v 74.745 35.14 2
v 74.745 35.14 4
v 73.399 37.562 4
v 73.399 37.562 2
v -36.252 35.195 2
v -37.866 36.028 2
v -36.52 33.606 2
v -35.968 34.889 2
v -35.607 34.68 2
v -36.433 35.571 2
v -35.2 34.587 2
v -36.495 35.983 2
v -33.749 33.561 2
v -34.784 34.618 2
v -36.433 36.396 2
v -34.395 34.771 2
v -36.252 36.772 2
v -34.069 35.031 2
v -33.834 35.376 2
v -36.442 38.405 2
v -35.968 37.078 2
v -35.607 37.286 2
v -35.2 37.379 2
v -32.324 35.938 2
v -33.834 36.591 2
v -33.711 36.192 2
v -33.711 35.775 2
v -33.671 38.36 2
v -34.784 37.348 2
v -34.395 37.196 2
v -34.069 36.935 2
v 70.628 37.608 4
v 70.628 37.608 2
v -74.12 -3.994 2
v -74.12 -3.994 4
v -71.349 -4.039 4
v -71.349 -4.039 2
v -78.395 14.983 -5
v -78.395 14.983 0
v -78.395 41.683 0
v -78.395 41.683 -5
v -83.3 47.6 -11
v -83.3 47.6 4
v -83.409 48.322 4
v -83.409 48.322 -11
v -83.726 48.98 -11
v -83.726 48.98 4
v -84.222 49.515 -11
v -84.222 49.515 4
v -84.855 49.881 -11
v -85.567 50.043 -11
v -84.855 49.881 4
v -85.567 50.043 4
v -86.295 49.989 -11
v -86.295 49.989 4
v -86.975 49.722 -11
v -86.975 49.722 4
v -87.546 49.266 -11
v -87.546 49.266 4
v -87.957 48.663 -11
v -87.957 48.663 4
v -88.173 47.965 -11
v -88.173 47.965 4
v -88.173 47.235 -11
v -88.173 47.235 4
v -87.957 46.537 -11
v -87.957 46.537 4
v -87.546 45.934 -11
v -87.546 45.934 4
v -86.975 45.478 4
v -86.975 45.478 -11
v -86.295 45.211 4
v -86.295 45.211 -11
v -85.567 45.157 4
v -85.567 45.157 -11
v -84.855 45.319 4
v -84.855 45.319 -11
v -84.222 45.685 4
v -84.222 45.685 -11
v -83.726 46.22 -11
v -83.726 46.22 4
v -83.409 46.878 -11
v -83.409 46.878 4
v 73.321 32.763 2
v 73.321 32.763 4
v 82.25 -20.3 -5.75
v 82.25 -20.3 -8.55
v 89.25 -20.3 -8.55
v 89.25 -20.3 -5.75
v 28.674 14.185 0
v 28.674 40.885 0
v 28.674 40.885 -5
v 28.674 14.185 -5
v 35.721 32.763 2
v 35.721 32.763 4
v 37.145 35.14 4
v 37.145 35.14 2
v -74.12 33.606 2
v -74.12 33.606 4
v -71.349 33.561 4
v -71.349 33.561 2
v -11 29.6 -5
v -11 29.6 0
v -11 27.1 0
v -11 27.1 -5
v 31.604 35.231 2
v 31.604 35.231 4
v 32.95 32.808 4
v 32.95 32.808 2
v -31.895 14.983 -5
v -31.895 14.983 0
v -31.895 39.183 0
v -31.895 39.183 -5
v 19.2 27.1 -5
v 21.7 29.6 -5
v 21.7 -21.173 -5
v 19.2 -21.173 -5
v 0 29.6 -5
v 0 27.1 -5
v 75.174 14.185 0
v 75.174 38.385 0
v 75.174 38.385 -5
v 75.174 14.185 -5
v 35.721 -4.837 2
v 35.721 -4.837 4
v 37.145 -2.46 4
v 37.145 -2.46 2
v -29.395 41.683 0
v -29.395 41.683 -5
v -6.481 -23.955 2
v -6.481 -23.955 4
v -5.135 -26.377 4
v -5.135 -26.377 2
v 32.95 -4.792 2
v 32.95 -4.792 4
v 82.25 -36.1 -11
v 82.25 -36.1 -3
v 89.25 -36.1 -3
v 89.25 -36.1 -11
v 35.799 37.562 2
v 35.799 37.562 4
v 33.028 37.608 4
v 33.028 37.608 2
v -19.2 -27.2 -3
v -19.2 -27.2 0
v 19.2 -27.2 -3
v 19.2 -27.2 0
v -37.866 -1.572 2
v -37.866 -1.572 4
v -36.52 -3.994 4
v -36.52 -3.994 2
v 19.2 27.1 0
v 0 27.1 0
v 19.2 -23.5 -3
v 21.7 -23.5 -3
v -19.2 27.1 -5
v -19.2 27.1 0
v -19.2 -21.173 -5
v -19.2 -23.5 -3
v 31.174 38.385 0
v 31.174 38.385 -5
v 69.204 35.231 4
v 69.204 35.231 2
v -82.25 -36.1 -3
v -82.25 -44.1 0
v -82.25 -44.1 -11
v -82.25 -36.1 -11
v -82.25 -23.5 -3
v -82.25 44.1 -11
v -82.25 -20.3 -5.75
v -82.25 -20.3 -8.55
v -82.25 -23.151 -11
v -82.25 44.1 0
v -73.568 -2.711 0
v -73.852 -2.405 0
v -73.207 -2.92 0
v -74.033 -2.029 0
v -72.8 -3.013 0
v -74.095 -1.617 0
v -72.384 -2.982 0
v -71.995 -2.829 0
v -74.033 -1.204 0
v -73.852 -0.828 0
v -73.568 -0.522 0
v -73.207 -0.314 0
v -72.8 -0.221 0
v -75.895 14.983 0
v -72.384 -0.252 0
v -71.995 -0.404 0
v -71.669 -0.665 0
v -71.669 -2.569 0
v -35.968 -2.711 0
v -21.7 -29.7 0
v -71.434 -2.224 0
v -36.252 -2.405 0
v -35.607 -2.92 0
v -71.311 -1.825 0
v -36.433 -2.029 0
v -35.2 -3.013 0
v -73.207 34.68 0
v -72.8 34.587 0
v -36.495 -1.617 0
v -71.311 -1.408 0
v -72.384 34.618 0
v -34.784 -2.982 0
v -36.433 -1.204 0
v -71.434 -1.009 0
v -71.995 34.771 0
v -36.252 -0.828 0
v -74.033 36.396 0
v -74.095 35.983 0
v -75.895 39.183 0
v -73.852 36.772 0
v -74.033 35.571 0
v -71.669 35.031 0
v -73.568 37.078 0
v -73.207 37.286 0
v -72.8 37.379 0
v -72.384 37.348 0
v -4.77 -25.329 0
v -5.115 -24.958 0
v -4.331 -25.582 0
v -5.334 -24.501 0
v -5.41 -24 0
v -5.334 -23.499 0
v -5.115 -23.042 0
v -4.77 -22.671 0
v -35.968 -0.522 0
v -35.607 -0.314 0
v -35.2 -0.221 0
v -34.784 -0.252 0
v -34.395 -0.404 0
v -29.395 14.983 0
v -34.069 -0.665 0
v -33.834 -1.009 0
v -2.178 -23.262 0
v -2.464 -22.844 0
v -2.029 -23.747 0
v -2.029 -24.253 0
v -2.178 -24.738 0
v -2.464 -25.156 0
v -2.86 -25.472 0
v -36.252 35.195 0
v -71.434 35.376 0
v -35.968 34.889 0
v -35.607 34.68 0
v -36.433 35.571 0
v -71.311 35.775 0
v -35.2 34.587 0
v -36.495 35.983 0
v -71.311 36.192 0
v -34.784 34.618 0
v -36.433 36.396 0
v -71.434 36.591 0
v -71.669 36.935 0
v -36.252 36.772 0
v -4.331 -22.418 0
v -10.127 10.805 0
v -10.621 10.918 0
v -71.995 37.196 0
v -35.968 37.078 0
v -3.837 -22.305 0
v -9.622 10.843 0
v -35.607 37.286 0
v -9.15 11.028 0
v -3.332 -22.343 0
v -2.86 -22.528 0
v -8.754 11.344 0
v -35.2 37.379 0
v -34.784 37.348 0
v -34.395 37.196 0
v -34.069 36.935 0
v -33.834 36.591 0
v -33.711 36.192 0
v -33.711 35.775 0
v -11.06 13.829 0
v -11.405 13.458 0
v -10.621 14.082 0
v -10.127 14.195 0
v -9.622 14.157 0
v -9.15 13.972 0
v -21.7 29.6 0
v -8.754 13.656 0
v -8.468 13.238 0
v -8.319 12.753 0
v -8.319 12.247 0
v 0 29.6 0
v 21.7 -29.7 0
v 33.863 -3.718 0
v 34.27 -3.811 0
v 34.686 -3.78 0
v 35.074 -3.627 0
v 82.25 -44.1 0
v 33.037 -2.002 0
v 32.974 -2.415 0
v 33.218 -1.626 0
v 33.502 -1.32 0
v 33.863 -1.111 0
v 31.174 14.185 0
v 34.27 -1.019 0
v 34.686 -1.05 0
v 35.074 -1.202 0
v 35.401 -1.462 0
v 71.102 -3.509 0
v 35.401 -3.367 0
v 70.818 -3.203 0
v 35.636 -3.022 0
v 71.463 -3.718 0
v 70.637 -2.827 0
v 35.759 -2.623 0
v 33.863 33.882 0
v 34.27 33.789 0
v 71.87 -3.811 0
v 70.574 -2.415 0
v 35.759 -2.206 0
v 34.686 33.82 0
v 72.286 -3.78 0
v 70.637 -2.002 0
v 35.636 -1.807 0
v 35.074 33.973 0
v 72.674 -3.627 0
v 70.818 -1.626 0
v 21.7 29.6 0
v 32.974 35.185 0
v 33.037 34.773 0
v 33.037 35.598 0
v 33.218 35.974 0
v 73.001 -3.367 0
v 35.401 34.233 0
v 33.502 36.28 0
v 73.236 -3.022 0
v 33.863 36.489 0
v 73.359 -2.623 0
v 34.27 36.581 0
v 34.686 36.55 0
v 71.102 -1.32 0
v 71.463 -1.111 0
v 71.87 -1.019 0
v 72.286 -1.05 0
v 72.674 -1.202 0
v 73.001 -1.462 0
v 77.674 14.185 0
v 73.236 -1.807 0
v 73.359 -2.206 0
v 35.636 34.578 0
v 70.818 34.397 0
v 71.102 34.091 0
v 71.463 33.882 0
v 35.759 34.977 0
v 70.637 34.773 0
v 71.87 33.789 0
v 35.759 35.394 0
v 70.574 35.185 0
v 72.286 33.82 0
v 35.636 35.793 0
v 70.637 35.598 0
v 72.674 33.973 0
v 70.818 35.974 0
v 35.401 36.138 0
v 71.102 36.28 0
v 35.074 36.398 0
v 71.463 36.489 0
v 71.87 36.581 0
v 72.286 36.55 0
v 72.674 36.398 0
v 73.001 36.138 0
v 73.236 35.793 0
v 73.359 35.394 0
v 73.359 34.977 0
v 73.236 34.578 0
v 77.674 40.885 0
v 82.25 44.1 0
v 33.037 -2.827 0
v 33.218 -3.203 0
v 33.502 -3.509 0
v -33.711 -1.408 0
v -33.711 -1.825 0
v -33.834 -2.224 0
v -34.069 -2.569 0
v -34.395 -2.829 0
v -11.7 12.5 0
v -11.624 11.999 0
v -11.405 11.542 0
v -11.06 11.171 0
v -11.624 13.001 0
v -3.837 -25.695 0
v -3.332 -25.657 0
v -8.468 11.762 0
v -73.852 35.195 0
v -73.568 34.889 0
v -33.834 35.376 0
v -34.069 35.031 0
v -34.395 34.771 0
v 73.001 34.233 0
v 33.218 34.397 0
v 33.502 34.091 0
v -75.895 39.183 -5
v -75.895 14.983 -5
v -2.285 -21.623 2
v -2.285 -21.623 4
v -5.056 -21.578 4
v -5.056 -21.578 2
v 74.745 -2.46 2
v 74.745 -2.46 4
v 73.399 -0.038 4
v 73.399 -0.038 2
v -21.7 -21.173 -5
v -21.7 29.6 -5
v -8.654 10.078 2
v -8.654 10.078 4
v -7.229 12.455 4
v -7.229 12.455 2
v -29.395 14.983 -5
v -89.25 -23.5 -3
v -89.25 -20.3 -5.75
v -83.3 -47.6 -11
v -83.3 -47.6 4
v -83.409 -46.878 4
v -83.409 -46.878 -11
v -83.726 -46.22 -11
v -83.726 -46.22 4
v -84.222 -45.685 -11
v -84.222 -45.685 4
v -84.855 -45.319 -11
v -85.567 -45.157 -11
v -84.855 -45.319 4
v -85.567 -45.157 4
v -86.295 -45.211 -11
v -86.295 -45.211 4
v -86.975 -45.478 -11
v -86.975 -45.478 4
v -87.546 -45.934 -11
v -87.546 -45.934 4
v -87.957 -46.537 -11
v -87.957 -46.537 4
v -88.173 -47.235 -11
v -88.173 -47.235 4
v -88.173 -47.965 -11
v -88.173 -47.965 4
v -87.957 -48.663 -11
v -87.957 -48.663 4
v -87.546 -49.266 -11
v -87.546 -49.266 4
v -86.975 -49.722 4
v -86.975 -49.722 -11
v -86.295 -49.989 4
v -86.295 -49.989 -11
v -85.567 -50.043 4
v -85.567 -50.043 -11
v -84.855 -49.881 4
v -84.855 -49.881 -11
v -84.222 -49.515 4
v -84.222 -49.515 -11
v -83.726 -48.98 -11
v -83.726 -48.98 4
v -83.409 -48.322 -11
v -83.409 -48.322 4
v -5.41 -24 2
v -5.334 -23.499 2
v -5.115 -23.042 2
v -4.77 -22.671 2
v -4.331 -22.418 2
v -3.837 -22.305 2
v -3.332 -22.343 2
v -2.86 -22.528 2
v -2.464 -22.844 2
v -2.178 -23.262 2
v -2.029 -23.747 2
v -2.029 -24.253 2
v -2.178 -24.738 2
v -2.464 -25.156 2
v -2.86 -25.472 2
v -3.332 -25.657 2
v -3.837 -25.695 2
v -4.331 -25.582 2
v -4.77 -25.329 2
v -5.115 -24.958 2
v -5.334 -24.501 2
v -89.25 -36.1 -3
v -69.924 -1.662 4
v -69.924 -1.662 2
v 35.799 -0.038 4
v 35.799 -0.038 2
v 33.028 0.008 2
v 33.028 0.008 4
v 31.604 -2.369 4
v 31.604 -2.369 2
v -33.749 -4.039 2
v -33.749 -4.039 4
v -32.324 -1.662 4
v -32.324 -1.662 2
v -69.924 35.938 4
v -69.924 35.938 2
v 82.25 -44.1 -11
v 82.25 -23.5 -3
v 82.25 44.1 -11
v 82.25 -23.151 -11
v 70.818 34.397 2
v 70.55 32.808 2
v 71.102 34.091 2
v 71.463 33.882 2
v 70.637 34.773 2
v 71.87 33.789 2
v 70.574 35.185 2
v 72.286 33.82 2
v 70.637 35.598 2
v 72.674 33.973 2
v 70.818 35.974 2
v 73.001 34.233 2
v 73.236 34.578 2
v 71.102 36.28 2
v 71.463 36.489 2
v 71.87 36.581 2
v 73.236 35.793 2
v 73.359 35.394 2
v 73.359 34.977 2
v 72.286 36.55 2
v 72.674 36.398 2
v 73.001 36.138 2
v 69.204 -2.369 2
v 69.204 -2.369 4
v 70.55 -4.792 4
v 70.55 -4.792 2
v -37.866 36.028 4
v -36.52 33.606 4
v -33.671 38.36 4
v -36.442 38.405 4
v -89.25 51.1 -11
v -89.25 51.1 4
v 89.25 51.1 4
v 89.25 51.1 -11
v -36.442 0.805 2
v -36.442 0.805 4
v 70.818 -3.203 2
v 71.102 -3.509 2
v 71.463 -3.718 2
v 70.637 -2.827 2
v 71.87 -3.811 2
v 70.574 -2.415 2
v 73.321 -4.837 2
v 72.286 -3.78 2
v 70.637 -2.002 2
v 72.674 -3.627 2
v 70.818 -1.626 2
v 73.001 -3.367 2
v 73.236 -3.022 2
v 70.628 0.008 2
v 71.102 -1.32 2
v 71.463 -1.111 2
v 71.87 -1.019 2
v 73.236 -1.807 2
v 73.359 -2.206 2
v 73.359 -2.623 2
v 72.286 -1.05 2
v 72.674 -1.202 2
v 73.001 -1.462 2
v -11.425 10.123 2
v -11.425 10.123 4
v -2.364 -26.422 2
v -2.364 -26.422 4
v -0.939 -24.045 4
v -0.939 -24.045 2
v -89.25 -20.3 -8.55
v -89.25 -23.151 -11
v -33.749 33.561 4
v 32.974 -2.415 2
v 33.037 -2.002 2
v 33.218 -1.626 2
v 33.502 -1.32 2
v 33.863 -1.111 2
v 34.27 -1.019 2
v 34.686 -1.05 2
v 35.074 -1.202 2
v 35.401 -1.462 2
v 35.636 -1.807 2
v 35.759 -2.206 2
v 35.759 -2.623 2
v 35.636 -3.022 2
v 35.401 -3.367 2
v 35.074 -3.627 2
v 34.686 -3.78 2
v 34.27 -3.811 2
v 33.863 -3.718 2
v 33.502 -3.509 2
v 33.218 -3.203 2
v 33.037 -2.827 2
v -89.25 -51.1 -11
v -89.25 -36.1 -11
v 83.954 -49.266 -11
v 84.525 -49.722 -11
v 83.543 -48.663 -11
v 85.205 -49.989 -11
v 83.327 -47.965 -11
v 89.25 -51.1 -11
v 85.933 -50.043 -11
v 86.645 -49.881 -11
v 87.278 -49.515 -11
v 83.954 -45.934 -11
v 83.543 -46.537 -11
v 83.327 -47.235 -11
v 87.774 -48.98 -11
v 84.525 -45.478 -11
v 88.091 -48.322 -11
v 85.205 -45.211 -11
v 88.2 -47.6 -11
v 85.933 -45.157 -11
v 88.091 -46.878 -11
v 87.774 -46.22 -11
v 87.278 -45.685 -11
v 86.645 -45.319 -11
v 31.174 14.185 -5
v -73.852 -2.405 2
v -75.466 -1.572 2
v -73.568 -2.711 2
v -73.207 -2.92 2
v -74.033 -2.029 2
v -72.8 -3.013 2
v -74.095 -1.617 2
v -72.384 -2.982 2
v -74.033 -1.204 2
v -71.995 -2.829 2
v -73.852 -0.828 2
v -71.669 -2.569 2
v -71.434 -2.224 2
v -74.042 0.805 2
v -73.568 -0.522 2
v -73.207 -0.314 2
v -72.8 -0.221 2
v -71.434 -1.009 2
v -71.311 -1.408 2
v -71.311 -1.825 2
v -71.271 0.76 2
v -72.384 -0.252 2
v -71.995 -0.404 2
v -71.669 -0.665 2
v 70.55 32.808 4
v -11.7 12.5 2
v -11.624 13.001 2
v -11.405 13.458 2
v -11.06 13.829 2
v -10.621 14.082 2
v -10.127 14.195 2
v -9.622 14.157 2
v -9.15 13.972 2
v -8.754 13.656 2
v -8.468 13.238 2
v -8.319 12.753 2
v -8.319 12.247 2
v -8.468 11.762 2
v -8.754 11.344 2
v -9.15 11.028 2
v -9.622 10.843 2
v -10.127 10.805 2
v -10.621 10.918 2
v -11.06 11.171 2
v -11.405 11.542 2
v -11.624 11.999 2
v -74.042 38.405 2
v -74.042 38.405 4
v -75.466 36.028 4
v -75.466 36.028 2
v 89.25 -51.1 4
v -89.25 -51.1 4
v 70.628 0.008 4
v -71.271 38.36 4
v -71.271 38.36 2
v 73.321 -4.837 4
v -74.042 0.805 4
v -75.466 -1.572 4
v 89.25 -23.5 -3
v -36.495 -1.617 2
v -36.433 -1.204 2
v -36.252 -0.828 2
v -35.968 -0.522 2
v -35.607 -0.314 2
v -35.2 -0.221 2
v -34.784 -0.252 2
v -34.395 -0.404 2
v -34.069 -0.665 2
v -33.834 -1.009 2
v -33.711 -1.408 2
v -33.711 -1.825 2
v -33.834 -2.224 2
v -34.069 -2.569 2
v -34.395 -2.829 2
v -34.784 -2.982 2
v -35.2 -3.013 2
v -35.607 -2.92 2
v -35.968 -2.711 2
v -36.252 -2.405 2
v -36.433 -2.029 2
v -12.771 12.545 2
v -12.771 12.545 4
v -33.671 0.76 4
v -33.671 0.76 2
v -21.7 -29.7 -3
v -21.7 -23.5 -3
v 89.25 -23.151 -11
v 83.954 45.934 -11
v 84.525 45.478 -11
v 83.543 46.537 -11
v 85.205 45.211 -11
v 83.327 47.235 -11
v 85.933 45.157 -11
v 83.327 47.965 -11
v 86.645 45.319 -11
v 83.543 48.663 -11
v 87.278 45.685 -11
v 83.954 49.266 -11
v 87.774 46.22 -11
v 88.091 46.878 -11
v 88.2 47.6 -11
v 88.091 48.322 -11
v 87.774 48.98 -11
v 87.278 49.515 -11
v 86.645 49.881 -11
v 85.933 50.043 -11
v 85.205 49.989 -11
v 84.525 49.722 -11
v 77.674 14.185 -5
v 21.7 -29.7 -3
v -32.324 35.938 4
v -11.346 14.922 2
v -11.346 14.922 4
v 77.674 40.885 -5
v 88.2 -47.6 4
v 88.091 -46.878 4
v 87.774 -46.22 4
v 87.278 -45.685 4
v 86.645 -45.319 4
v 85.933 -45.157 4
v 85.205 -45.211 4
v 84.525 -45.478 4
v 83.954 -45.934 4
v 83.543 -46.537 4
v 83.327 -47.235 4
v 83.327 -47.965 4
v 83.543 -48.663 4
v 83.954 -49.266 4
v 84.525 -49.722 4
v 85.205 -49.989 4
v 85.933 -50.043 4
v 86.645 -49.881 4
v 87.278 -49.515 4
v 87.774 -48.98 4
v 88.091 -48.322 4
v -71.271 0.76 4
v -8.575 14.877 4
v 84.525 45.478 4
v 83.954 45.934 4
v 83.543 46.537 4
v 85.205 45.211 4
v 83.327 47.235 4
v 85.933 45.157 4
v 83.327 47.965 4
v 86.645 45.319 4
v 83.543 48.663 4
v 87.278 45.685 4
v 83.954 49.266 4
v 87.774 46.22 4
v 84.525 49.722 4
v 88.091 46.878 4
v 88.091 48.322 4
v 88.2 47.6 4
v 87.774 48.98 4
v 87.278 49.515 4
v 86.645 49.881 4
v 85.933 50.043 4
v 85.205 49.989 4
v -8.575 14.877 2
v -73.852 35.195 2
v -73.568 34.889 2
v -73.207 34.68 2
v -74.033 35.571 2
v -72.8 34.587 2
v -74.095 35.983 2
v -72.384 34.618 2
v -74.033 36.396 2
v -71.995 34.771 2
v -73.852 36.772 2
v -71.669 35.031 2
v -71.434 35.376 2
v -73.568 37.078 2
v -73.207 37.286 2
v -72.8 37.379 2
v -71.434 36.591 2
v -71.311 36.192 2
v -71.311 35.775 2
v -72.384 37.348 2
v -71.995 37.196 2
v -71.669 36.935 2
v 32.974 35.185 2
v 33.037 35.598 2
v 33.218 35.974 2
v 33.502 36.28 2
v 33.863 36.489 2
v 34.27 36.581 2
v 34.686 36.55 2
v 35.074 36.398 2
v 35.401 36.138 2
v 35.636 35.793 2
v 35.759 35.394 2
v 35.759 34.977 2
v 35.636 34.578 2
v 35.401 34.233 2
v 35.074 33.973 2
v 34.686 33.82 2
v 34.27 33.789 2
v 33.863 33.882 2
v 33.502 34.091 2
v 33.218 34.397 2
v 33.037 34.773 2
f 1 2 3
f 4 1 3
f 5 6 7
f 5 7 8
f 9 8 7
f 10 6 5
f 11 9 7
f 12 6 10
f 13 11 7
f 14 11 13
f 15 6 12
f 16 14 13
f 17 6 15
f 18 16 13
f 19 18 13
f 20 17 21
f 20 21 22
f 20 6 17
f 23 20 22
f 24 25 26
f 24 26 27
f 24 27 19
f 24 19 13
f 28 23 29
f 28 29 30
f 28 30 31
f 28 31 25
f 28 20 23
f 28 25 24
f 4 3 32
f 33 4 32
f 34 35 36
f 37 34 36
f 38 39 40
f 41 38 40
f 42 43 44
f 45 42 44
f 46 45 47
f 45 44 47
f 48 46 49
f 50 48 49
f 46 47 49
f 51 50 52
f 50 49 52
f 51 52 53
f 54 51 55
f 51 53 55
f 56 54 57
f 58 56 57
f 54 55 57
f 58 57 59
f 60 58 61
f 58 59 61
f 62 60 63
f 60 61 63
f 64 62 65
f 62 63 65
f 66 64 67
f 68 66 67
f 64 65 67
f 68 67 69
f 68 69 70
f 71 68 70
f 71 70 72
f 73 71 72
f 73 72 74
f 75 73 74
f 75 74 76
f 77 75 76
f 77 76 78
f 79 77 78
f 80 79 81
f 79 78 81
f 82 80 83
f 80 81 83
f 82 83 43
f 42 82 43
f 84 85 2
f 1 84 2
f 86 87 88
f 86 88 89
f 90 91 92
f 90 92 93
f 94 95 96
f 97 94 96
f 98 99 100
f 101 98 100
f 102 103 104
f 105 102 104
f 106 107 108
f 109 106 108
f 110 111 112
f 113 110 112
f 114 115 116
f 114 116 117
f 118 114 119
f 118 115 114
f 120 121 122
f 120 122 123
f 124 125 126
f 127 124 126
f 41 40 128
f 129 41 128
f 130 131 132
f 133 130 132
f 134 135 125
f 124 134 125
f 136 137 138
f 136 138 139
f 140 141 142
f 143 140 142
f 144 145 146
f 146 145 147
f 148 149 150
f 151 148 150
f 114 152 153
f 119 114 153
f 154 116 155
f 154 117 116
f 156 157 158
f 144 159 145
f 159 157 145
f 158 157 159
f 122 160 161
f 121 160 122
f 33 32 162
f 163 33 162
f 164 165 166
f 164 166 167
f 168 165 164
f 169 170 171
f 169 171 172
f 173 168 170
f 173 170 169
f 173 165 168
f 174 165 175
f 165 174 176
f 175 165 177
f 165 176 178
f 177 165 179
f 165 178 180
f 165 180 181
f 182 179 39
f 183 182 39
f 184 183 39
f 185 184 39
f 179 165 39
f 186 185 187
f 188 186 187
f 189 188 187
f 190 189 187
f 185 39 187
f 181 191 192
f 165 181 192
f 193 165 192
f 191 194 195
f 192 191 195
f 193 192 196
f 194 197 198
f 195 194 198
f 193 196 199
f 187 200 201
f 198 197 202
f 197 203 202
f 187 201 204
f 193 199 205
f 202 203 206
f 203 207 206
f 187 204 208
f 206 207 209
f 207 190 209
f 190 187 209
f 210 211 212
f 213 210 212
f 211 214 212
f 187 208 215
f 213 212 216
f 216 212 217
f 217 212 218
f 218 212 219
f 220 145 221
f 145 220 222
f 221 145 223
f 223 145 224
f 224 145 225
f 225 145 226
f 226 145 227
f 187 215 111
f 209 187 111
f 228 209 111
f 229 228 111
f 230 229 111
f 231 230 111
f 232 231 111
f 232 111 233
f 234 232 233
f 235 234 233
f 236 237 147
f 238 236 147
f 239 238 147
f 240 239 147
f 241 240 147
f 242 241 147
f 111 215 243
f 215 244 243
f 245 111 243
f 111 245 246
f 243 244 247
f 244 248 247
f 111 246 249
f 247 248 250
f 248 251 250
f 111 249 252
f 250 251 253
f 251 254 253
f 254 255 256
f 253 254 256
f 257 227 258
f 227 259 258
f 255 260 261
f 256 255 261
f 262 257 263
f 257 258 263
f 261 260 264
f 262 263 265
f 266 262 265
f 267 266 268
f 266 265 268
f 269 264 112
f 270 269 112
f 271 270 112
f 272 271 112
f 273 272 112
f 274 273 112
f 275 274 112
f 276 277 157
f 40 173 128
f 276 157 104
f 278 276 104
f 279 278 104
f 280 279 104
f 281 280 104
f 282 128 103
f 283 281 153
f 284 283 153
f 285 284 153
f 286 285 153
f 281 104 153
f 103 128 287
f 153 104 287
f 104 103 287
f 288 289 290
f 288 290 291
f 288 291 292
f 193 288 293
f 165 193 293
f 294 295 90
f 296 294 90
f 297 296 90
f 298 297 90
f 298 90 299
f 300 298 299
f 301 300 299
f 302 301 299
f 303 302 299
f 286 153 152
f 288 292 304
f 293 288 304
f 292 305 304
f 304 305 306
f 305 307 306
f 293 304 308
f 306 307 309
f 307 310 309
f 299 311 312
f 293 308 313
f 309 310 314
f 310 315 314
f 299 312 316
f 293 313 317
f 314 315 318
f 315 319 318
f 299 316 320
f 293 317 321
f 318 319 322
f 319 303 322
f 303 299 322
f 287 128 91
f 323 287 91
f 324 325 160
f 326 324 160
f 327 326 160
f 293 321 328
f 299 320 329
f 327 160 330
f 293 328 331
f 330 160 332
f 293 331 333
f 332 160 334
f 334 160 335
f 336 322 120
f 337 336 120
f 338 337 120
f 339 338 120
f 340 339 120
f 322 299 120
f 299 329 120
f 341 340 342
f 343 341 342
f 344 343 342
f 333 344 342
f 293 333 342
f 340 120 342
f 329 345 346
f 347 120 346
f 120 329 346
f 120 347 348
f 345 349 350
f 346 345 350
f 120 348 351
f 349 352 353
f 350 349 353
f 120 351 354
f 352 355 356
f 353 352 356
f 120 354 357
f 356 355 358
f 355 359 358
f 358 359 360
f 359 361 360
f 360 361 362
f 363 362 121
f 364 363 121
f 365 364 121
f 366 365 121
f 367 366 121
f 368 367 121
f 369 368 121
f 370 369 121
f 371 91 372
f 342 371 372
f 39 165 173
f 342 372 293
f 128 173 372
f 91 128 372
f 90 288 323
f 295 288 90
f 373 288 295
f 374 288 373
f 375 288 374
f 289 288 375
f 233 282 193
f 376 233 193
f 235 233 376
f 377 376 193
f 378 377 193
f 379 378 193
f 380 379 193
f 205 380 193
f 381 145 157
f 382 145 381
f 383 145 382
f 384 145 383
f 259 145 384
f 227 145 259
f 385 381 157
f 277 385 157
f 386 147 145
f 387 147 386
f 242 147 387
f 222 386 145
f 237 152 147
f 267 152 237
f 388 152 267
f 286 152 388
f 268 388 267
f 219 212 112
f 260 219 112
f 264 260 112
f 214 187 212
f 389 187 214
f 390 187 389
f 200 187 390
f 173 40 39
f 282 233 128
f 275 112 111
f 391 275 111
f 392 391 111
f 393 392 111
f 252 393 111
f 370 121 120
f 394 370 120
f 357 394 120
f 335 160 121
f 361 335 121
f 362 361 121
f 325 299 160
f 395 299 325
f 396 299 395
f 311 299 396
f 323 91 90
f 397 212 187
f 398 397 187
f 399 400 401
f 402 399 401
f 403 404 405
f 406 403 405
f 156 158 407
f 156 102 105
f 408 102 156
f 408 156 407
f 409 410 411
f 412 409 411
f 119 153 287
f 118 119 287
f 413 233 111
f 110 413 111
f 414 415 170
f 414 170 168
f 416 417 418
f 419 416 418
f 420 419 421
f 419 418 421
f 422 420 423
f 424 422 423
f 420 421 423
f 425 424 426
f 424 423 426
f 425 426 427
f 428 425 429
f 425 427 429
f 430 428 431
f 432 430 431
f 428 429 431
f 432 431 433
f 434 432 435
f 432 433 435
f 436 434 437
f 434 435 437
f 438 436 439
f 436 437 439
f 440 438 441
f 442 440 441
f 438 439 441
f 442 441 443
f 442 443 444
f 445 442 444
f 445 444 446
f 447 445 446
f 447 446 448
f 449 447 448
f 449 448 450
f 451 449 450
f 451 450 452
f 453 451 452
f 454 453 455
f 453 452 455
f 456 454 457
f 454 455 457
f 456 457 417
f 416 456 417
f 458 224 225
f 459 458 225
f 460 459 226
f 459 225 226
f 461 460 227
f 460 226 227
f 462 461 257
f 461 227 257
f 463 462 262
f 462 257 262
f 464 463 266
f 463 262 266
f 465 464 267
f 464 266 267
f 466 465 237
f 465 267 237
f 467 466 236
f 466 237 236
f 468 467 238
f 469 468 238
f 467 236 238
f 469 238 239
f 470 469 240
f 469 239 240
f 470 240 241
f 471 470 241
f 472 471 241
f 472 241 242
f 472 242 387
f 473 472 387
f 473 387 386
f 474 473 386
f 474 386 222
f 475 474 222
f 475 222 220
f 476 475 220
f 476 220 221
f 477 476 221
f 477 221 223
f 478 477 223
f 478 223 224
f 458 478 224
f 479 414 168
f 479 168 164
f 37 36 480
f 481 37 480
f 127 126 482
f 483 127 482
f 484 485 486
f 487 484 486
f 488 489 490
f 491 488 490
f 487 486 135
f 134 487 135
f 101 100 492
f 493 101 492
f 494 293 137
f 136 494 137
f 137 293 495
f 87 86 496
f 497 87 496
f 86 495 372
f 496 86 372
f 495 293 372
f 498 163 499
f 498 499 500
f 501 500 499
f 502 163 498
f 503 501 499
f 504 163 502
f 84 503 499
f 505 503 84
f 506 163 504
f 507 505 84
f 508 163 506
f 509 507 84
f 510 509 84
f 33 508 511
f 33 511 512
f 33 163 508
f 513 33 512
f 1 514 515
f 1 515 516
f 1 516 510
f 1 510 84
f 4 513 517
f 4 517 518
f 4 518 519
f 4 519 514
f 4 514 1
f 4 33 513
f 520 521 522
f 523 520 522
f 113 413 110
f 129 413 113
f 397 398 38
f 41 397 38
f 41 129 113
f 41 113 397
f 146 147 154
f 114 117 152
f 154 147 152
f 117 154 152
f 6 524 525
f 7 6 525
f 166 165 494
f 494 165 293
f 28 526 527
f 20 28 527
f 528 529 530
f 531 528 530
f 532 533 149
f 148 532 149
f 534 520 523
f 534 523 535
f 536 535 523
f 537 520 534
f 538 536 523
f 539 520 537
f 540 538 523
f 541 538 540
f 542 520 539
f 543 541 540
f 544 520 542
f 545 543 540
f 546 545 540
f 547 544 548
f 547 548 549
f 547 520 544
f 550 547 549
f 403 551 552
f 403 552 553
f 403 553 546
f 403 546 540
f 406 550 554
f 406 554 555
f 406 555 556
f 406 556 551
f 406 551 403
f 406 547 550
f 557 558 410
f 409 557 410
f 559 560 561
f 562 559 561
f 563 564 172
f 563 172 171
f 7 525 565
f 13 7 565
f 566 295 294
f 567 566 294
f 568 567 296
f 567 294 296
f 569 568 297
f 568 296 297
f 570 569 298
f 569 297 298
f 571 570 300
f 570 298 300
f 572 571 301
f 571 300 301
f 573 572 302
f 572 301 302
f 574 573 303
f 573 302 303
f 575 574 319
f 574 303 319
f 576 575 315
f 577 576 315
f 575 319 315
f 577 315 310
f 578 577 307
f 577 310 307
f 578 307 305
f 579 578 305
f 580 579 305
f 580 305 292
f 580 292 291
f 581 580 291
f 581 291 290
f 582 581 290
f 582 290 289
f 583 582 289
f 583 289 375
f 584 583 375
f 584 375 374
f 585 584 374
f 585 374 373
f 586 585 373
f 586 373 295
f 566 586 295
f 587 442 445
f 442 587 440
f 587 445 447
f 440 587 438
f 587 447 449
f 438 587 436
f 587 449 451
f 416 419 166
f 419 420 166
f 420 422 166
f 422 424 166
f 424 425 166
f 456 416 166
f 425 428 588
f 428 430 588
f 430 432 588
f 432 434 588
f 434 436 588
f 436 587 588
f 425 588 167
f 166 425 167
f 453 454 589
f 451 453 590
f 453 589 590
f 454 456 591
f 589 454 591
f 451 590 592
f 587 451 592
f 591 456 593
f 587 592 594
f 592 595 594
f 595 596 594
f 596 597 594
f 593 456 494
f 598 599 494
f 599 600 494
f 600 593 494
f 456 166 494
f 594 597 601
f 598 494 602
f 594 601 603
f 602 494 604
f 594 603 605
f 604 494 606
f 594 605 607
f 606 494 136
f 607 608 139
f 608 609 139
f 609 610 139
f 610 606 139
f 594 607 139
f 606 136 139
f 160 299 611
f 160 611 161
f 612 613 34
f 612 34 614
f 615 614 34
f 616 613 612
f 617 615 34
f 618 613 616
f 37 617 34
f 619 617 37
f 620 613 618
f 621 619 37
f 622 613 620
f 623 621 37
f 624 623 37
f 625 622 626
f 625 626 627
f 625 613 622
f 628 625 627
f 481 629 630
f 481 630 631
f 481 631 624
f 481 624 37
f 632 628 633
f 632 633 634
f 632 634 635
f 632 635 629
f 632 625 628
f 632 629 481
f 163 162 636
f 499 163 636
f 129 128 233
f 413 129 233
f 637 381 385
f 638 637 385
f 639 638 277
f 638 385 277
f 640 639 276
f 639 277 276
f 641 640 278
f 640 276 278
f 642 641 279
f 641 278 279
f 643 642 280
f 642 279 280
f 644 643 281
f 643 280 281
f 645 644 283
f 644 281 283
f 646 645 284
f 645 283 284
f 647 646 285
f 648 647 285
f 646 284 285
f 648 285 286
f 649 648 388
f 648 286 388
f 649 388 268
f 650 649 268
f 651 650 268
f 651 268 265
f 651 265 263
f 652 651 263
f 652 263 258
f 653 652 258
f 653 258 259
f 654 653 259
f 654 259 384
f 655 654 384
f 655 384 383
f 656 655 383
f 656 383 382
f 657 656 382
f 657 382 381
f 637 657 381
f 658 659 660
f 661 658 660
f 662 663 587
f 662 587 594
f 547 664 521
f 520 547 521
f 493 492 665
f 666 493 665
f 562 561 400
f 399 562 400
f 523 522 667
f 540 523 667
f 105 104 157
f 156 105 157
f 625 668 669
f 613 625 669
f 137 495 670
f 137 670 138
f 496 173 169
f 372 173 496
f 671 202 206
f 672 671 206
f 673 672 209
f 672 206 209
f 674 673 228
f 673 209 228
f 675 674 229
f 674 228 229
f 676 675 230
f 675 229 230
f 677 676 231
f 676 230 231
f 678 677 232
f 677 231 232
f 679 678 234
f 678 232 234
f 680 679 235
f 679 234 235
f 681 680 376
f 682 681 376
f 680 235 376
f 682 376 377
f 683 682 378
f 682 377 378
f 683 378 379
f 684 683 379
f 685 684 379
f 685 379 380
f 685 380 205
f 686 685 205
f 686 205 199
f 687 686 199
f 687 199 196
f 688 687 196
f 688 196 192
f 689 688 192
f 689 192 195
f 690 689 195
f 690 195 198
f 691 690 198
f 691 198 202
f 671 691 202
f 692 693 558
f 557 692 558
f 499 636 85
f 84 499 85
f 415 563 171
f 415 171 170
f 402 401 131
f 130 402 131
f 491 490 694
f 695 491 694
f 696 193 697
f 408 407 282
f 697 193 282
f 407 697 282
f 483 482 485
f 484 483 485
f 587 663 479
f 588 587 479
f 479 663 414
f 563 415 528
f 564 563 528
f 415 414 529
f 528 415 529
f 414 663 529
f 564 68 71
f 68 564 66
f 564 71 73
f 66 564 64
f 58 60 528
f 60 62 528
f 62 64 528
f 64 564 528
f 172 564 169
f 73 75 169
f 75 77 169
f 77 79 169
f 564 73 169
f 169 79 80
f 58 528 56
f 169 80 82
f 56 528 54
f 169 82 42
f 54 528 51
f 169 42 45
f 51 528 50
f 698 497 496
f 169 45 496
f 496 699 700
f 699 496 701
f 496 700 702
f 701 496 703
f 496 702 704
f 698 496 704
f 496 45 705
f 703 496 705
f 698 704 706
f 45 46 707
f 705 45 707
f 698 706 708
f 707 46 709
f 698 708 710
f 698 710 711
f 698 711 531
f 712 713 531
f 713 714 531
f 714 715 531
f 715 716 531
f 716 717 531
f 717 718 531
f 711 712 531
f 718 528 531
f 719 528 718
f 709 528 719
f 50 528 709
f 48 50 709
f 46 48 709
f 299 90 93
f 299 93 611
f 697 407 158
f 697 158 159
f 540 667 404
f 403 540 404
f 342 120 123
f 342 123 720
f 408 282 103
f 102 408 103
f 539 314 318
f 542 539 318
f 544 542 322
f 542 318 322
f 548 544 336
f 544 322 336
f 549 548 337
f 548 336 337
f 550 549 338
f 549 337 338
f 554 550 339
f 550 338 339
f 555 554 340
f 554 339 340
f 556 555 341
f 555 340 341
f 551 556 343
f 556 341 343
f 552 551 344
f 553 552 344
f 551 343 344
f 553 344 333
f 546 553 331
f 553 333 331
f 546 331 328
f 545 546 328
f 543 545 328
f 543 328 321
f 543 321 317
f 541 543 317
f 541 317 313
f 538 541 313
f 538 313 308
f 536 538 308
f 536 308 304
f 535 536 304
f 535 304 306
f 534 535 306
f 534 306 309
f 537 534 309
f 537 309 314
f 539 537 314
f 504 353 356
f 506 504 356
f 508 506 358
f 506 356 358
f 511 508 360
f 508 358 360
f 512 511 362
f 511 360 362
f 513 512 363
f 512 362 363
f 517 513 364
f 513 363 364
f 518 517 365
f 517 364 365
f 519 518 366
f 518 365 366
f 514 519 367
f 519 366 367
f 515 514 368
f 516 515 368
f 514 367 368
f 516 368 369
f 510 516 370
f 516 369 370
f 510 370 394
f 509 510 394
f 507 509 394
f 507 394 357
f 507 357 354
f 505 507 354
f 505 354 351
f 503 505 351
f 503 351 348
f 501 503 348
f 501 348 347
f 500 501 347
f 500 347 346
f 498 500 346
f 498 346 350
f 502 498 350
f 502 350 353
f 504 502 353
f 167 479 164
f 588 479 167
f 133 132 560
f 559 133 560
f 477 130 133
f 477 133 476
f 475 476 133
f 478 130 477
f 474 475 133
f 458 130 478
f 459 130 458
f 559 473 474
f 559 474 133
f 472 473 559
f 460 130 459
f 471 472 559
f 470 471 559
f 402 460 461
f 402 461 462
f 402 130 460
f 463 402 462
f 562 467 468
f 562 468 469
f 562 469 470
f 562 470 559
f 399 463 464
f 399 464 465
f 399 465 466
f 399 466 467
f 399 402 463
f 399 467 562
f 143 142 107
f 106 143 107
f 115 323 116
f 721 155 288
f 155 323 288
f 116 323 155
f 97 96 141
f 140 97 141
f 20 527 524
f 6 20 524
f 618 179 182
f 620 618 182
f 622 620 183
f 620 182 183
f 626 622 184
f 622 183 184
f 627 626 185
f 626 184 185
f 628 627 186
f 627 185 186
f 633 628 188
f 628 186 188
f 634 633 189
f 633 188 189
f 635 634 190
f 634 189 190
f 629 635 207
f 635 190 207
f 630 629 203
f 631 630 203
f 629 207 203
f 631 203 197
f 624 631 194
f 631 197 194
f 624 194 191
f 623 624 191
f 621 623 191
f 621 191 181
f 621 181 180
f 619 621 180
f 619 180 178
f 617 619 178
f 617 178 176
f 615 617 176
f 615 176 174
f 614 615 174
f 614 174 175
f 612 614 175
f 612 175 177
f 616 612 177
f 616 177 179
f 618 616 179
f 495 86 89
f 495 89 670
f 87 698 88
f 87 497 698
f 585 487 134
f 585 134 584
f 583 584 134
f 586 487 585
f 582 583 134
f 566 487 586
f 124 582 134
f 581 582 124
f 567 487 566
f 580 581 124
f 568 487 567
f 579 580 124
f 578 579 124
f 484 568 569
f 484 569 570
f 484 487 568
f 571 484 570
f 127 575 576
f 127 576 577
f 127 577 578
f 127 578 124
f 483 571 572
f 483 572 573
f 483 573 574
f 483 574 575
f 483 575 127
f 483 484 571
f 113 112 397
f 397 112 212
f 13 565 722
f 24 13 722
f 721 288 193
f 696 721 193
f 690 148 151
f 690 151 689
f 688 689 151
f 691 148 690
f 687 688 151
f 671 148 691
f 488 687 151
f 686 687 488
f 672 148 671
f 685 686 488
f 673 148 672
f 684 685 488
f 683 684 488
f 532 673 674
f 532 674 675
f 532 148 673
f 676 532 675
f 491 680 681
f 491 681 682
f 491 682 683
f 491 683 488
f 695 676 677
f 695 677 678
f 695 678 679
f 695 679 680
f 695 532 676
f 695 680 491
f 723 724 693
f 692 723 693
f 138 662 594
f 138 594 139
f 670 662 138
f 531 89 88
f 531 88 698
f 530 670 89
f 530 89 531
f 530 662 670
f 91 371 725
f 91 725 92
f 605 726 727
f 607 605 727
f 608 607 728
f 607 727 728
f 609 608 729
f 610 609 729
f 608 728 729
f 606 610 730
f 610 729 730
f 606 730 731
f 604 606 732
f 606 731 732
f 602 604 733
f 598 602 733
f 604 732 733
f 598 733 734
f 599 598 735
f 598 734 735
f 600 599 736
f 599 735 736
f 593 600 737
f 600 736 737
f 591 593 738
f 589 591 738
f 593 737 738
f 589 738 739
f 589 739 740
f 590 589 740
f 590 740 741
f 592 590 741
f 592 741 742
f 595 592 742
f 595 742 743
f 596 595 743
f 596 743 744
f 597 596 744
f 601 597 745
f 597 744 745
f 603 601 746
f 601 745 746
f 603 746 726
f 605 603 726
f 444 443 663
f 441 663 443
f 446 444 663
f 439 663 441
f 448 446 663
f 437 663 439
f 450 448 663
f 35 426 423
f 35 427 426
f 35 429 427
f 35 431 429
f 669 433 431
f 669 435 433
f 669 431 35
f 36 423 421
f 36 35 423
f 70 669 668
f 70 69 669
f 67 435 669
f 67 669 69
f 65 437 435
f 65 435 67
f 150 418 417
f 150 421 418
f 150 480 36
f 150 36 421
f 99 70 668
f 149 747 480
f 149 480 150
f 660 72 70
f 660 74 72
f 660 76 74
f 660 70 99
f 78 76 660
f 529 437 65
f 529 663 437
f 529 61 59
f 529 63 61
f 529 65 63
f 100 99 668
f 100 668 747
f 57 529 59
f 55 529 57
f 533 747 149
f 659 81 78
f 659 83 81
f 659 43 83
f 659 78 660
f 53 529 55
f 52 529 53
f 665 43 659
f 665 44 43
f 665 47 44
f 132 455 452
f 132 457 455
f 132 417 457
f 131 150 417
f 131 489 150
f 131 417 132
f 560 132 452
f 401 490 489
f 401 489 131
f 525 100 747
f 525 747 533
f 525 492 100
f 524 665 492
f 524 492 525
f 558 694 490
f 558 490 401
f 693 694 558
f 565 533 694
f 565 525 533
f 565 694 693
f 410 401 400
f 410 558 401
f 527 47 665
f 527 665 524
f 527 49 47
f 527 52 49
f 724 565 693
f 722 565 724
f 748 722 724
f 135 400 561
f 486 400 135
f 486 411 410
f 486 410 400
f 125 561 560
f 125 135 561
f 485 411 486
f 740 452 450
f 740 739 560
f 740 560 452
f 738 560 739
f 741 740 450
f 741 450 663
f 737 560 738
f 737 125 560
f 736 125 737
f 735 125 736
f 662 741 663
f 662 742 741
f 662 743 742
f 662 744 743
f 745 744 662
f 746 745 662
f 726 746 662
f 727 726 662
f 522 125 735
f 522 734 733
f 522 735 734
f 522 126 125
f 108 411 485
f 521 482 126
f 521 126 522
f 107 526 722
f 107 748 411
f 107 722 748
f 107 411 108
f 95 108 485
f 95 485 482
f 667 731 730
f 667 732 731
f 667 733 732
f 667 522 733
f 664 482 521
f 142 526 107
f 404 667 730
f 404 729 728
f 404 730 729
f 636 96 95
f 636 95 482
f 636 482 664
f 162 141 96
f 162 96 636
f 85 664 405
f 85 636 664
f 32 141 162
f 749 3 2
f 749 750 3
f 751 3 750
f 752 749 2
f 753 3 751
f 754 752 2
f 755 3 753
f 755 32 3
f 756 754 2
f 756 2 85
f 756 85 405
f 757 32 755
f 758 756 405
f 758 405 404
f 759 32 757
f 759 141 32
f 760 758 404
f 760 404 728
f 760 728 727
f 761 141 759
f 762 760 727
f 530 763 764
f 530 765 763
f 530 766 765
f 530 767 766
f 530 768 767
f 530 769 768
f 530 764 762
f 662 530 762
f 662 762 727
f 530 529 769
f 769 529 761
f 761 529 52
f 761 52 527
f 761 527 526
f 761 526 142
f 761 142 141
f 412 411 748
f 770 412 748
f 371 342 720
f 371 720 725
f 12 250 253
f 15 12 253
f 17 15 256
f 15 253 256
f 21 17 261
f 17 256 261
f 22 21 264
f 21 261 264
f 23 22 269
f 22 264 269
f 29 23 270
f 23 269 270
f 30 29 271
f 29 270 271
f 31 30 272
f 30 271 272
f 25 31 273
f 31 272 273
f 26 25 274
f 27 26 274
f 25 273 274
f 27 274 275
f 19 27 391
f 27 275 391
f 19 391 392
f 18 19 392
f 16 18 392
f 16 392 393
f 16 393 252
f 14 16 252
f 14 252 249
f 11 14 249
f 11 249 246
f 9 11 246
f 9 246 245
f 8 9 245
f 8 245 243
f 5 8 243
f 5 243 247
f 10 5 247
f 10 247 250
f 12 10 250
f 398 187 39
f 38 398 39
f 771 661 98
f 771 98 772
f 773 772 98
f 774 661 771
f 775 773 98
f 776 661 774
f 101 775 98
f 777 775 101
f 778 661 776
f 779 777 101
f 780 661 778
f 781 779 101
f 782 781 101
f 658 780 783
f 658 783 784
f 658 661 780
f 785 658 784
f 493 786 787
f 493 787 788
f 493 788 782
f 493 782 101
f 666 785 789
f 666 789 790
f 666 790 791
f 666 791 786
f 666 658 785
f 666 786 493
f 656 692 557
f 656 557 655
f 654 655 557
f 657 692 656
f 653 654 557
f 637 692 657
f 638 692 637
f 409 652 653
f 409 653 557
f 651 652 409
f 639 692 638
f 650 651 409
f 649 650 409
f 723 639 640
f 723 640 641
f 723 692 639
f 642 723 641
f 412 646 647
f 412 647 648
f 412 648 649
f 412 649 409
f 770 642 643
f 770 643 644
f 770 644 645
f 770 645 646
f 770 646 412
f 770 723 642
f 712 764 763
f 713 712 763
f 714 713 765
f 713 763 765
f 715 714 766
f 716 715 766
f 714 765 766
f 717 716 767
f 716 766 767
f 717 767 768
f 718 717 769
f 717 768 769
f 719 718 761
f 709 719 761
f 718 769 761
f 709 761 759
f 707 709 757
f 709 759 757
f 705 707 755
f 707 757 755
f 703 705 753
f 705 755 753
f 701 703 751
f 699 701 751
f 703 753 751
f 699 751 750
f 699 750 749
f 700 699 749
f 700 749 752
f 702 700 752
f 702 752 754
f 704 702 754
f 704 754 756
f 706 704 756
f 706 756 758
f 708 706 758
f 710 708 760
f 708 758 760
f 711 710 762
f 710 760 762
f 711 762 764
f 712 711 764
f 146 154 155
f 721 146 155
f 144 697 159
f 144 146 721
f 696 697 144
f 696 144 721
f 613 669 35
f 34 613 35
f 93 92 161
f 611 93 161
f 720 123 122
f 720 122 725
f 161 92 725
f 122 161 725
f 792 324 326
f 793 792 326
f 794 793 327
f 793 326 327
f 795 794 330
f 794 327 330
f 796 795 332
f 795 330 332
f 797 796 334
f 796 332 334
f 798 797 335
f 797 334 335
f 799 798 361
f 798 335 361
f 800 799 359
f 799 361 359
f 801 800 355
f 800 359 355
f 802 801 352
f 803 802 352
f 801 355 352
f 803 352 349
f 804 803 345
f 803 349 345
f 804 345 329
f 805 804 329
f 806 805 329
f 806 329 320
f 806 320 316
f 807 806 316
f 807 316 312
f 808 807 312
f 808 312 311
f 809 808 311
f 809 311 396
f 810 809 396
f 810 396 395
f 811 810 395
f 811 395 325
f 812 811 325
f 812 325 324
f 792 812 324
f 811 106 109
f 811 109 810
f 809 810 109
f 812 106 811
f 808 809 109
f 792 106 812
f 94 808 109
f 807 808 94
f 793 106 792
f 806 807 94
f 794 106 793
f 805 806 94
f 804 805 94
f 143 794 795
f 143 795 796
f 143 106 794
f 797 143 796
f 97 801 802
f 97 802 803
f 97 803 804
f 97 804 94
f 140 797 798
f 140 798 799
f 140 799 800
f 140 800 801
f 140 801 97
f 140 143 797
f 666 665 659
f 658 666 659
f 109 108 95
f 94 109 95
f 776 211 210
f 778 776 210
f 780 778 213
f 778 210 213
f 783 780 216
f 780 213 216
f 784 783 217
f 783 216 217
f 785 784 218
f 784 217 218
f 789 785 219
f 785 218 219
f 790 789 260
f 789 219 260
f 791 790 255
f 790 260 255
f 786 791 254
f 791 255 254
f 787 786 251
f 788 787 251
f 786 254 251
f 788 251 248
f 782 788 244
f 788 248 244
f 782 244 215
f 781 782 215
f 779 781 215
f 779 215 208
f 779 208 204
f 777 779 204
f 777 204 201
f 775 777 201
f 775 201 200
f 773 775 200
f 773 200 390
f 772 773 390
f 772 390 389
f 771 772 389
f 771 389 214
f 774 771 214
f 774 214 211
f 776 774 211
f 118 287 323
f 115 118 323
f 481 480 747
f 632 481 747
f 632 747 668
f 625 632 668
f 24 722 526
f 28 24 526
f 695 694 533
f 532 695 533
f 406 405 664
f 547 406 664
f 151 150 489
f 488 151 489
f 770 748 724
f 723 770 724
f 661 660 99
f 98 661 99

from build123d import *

# Parameters (mm, degrees)
SKETCH_1_W               = 164.5
SKETCH_1_H               = 88.2
EXTRUDE_1_DEPTH          = 4
SKETCH_2_W               = 178.5
SKETCH_2_H               = 102.2
SKETCH_2_R               = 2.45
SKETCH_2_W_2             = 164.5
SKETCH_2_H_2             = 88.2
EXTRUDE_3_DEPTH          = 15
EXTRUDE_5_DEPTH          = 5
SKETCH_3_4_R             = 1.7
CUT_EXTRUDE_3_DEPTH      = 12
CUT_EXTRUDE_3_DEPTH_BACK = 5
EXTRUDE_6_DEPTH          = 5
SKETCH_4_3_R             = 1.4
CUT_EXTRUDE_4_DEPTH      = 12
CUT_EXTRUDE_4_DEPTH_BACK = 5
CUT_EXTRUDE_5_DEPTH      = 1
CUT_EXTRUDE_5_DEPTH_BACK = 179.5
CUT_EXTRUDE_6_DEPTH      = 2


with BuildPart() as part:
    # Sketch 1 → Extrude 1 (new body)
    with BuildSketch(Plane.XY):
        Rectangle(SKETCH_1_W, SKETCH_1_H)
    extrude(amount=EXTRUDE_1_DEPTH)

    # Sketch 2 → Extrude 3 (add)
    with BuildSketch(Plane.XY.offset(4)):
        Rectangle(SKETCH_2_W, SKETCH_2_H)
        with Locations((-85.75, 47.6)):
            Circle(SKETCH_2_R, mode=Mode.SUBTRACT)
        with Locations((-85.75, -47.6)):
            Circle(SKETCH_2_R, mode=Mode.SUBTRACT)
        with Locations((85.75, 47.6)):
            Circle(SKETCH_2_R, mode=Mode.SUBTRACT)
        with Locations((85.75, -47.6)):
            Circle(SKETCH_2_R, mode=Mode.SUBTRACT)
        Rectangle(SKETCH_2_W_2, SKETCH_2_H_2, mode=Mode.SUBTRACT)
    extrude(amount=-EXTRUDE_3_DEPTH)

    # Sketch 3 → Extrude 5 (add)
    with BuildSketch(Plane(origin=(0, 0, 0), x_dir=(-1, 0, 0), z_dir=(0, 0, -1))):
        Polygon((-21.7, 29.6), (-21.7, -29.7), (21.7, -29.7), (21.7, 29.6), (11, 29.6), (11, 27.1), (19.2, 27.1), (19.2, -27.2), (-19.2, -27.2), (-19.2, 27.1), (0, 27.1), (0, 29.6), align=None)
    extrude(amount=EXTRUDE_5_DEPTH)

    # Sketch 3_4 → Cut-Extrude 3 (cut, two sides)
    with BuildSketch(Plane(origin=(0, 0, 0), x_dir=(-1, 0, 0), z_dir=(0, 0, -1))) as cut_extrude_3_sk:
        with Locations((3.71, -24)):
            Circle(SKETCH_3_4_R)
        with Locations((10, 12.5)):
            Circle(SKETCH_3_4_R)
    extrude(amount=CUT_EXTRUDE_3_DEPTH, mode=Mode.SUBTRACT)
    extrude(cut_extrude_3_sk.sketch, amount=-CUT_EXTRUDE_3_DEPTH_BACK, mode=Mode.SUBTRACT)

    # Sketch 4 → Extrude 6 (add)
    with BuildSketch(Plane(origin=(0, 0, 0), x_dir=(-1, 0, 0), z_dir=(0, 0, -1))):
        Polygon((75.895357905, 39.183227458), (75.895357905, 14.983227458), (78.395357905, 14.983227458), (78.395357905, 41.683227458), (29.395357905, 41.683227458), (29.395357905, 14.983227458), (31.895357905, 14.983227458), (31.895357905, 39.183227458), align=None)
        Polygon((-77.674472702, 40.885349978), (-28.674472702, 40.885349978), (-28.674472702, 14.185349978), (-31.174472702, 14.185349978), (-31.174472702, 38.385349978), (-75.174472702, 38.385349978), (-75.174472702, 14.185349978), (-77.674472702, 14.185349978), align=None)
    extrude(amount=EXTRUDE_6_DEPTH)

    # Sketch 4_3 → Cut-Extrude 4 (cut, two sides)
    with BuildSketch(Plane(origin=(0, 0, 0), x_dir=(-1, 0, 0), z_dir=(0, 0, -1))) as cut_extrude_4_sk:
        with Locations((72.695357905, 35.983227458)):
            Circle(SKETCH_4_3_R)
        with Locations((72.695357905, -1.616772542)):
            Circle(SKETCH_4_3_R)
        with Locations((35.095357905, -1.616772542)):
            Circle(SKETCH_4_3_R)
        with Locations((35.095357905, 35.983227458)):
            Circle(SKETCH_4_3_R)
        with Locations((-34.374472702, 35.185349978)):
            Circle(SKETCH_4_3_R)
        with Locations((-34.374472702, -2.414650022)):
            Circle(SKETCH_4_3_R)
        with Locations((-71.974472702, -2.414650022)):
            Circle(SKETCH_4_3_R)
        with Locations((-71.974472702, 35.185349978)):
            Circle(SKETCH_4_3_R)
    extrude(amount=CUT_EXTRUDE_4_DEPTH, mode=Mode.SUBTRACT)
    extrude(cut_extrude_4_sk.sketch, amount=-CUT_EXTRUDE_4_DEPTH_BACK, mode=Mode.SUBTRACT)

    # Sketch 5 → Cut-Extrude 5 (cut, two sides)
    with BuildSketch(Plane.ZY.offset(89.25)) as cut_extrude_5_sk:
        Polygon((-8.55, -20.3), (-5.75, -20.3), (-3, -23.5), (-3, -36.1), (-11.3, -36.1), (-11.3, -23.5), align=None)
    extrude(amount=CUT_EXTRUDE_5_DEPTH, mode=Mode.SUBTRACT)
    extrude(cut_extrude_5_sk.sketch, amount=-CUT_EXTRUDE_5_DEPTH_BACK, mode=Mode.SUBTRACT)

    # Sketch 6 → Cut-Extrude 6 (cut)
    with BuildSketch(Plane.XY.offset(4)):
        Polygon((-37.866270853, 36.028409728), (-36.519943372, 33.606137589), (-33.749030425, 33.560955319), (-32.324444958, 35.938045189), (-33.670772438, 38.360317328), (-36.441685386, 38.405499597), align=None)
        Polygon((-71.349030425, 33.560955319), (-69.924444958, 35.938045189), (-71.270772438, 38.360317328), (-74.041685386, 38.405499597), (-75.466270853, 36.028409728), (-74.119943372, 33.606137589), align=None)
        Polygon((-33.670772438, 0.760317328), (-36.441685386, 0.805499597), (-37.866270853, -1.571590272), (-36.519943372, -3.993862411), (-33.749030425, -4.039044681), (-32.324444958, -1.661954811), align=None)
        Polygon((-71.349030425, -4.039044681), (-69.924444958, -1.661954811), (-71.270772438, 0.760317328), (-74.041685386, 0.805499597), (-75.466270853, -1.571590272), (-74.119943372, -3.993862411), align=None)
        Polygon((35.799058169, 37.562439847), (33.028145222, 37.607622117), (31.603559755, 35.230532247), (32.949887235, 32.808260108), (35.720800183, 32.763077839), (37.14538565, 35.140167708), align=None)
        Polygon((33.028145222, 0.007622117), (31.603559755, -2.369467753), (32.949887235, -4.791739892), (35.720800183, -4.836922161), (37.14538565, -2.459832292), (35.799058169, -0.037560153), align=None)
        Polygon((69.203559755, 35.230532247), (70.549887235, 32.808260108), (73.320800183, 32.763077839), (74.74538565, 35.140167708), (73.399058169, 37.562439847), (70.628145222, 37.607622117), align=None)
        Polygon((73.399058169, -0.037560153), (70.628145222, 0.007622117), (69.203559755, -2.369467753), (70.549887235, -4.791739892), (73.320800183, -4.836922161), (74.74538565, -2.459832292), align=None)
        Polygon((-11.346327481, 14.922272139), (-12.770912947, 12.54518227), (-11.424585467, 10.122910131), (-8.653672519, 10.077727861), (-7.229087053, 12.45481773), (-8.575414533, 14.877089869), align=None)
        Polygon((-5.056327481, -21.577727861), (-6.480912947, -23.95481773), (-5.134585467, -26.377089869), (-2.363672519, -26.422272139), (-0.939087053, -24.04518227), (-2.285414533, -21.622910131), align=None)
    extrude(amount=-CUT_EXTRUDE_6_DEPTH, mode=Mode.SUBTRACT)


solid = part.part
